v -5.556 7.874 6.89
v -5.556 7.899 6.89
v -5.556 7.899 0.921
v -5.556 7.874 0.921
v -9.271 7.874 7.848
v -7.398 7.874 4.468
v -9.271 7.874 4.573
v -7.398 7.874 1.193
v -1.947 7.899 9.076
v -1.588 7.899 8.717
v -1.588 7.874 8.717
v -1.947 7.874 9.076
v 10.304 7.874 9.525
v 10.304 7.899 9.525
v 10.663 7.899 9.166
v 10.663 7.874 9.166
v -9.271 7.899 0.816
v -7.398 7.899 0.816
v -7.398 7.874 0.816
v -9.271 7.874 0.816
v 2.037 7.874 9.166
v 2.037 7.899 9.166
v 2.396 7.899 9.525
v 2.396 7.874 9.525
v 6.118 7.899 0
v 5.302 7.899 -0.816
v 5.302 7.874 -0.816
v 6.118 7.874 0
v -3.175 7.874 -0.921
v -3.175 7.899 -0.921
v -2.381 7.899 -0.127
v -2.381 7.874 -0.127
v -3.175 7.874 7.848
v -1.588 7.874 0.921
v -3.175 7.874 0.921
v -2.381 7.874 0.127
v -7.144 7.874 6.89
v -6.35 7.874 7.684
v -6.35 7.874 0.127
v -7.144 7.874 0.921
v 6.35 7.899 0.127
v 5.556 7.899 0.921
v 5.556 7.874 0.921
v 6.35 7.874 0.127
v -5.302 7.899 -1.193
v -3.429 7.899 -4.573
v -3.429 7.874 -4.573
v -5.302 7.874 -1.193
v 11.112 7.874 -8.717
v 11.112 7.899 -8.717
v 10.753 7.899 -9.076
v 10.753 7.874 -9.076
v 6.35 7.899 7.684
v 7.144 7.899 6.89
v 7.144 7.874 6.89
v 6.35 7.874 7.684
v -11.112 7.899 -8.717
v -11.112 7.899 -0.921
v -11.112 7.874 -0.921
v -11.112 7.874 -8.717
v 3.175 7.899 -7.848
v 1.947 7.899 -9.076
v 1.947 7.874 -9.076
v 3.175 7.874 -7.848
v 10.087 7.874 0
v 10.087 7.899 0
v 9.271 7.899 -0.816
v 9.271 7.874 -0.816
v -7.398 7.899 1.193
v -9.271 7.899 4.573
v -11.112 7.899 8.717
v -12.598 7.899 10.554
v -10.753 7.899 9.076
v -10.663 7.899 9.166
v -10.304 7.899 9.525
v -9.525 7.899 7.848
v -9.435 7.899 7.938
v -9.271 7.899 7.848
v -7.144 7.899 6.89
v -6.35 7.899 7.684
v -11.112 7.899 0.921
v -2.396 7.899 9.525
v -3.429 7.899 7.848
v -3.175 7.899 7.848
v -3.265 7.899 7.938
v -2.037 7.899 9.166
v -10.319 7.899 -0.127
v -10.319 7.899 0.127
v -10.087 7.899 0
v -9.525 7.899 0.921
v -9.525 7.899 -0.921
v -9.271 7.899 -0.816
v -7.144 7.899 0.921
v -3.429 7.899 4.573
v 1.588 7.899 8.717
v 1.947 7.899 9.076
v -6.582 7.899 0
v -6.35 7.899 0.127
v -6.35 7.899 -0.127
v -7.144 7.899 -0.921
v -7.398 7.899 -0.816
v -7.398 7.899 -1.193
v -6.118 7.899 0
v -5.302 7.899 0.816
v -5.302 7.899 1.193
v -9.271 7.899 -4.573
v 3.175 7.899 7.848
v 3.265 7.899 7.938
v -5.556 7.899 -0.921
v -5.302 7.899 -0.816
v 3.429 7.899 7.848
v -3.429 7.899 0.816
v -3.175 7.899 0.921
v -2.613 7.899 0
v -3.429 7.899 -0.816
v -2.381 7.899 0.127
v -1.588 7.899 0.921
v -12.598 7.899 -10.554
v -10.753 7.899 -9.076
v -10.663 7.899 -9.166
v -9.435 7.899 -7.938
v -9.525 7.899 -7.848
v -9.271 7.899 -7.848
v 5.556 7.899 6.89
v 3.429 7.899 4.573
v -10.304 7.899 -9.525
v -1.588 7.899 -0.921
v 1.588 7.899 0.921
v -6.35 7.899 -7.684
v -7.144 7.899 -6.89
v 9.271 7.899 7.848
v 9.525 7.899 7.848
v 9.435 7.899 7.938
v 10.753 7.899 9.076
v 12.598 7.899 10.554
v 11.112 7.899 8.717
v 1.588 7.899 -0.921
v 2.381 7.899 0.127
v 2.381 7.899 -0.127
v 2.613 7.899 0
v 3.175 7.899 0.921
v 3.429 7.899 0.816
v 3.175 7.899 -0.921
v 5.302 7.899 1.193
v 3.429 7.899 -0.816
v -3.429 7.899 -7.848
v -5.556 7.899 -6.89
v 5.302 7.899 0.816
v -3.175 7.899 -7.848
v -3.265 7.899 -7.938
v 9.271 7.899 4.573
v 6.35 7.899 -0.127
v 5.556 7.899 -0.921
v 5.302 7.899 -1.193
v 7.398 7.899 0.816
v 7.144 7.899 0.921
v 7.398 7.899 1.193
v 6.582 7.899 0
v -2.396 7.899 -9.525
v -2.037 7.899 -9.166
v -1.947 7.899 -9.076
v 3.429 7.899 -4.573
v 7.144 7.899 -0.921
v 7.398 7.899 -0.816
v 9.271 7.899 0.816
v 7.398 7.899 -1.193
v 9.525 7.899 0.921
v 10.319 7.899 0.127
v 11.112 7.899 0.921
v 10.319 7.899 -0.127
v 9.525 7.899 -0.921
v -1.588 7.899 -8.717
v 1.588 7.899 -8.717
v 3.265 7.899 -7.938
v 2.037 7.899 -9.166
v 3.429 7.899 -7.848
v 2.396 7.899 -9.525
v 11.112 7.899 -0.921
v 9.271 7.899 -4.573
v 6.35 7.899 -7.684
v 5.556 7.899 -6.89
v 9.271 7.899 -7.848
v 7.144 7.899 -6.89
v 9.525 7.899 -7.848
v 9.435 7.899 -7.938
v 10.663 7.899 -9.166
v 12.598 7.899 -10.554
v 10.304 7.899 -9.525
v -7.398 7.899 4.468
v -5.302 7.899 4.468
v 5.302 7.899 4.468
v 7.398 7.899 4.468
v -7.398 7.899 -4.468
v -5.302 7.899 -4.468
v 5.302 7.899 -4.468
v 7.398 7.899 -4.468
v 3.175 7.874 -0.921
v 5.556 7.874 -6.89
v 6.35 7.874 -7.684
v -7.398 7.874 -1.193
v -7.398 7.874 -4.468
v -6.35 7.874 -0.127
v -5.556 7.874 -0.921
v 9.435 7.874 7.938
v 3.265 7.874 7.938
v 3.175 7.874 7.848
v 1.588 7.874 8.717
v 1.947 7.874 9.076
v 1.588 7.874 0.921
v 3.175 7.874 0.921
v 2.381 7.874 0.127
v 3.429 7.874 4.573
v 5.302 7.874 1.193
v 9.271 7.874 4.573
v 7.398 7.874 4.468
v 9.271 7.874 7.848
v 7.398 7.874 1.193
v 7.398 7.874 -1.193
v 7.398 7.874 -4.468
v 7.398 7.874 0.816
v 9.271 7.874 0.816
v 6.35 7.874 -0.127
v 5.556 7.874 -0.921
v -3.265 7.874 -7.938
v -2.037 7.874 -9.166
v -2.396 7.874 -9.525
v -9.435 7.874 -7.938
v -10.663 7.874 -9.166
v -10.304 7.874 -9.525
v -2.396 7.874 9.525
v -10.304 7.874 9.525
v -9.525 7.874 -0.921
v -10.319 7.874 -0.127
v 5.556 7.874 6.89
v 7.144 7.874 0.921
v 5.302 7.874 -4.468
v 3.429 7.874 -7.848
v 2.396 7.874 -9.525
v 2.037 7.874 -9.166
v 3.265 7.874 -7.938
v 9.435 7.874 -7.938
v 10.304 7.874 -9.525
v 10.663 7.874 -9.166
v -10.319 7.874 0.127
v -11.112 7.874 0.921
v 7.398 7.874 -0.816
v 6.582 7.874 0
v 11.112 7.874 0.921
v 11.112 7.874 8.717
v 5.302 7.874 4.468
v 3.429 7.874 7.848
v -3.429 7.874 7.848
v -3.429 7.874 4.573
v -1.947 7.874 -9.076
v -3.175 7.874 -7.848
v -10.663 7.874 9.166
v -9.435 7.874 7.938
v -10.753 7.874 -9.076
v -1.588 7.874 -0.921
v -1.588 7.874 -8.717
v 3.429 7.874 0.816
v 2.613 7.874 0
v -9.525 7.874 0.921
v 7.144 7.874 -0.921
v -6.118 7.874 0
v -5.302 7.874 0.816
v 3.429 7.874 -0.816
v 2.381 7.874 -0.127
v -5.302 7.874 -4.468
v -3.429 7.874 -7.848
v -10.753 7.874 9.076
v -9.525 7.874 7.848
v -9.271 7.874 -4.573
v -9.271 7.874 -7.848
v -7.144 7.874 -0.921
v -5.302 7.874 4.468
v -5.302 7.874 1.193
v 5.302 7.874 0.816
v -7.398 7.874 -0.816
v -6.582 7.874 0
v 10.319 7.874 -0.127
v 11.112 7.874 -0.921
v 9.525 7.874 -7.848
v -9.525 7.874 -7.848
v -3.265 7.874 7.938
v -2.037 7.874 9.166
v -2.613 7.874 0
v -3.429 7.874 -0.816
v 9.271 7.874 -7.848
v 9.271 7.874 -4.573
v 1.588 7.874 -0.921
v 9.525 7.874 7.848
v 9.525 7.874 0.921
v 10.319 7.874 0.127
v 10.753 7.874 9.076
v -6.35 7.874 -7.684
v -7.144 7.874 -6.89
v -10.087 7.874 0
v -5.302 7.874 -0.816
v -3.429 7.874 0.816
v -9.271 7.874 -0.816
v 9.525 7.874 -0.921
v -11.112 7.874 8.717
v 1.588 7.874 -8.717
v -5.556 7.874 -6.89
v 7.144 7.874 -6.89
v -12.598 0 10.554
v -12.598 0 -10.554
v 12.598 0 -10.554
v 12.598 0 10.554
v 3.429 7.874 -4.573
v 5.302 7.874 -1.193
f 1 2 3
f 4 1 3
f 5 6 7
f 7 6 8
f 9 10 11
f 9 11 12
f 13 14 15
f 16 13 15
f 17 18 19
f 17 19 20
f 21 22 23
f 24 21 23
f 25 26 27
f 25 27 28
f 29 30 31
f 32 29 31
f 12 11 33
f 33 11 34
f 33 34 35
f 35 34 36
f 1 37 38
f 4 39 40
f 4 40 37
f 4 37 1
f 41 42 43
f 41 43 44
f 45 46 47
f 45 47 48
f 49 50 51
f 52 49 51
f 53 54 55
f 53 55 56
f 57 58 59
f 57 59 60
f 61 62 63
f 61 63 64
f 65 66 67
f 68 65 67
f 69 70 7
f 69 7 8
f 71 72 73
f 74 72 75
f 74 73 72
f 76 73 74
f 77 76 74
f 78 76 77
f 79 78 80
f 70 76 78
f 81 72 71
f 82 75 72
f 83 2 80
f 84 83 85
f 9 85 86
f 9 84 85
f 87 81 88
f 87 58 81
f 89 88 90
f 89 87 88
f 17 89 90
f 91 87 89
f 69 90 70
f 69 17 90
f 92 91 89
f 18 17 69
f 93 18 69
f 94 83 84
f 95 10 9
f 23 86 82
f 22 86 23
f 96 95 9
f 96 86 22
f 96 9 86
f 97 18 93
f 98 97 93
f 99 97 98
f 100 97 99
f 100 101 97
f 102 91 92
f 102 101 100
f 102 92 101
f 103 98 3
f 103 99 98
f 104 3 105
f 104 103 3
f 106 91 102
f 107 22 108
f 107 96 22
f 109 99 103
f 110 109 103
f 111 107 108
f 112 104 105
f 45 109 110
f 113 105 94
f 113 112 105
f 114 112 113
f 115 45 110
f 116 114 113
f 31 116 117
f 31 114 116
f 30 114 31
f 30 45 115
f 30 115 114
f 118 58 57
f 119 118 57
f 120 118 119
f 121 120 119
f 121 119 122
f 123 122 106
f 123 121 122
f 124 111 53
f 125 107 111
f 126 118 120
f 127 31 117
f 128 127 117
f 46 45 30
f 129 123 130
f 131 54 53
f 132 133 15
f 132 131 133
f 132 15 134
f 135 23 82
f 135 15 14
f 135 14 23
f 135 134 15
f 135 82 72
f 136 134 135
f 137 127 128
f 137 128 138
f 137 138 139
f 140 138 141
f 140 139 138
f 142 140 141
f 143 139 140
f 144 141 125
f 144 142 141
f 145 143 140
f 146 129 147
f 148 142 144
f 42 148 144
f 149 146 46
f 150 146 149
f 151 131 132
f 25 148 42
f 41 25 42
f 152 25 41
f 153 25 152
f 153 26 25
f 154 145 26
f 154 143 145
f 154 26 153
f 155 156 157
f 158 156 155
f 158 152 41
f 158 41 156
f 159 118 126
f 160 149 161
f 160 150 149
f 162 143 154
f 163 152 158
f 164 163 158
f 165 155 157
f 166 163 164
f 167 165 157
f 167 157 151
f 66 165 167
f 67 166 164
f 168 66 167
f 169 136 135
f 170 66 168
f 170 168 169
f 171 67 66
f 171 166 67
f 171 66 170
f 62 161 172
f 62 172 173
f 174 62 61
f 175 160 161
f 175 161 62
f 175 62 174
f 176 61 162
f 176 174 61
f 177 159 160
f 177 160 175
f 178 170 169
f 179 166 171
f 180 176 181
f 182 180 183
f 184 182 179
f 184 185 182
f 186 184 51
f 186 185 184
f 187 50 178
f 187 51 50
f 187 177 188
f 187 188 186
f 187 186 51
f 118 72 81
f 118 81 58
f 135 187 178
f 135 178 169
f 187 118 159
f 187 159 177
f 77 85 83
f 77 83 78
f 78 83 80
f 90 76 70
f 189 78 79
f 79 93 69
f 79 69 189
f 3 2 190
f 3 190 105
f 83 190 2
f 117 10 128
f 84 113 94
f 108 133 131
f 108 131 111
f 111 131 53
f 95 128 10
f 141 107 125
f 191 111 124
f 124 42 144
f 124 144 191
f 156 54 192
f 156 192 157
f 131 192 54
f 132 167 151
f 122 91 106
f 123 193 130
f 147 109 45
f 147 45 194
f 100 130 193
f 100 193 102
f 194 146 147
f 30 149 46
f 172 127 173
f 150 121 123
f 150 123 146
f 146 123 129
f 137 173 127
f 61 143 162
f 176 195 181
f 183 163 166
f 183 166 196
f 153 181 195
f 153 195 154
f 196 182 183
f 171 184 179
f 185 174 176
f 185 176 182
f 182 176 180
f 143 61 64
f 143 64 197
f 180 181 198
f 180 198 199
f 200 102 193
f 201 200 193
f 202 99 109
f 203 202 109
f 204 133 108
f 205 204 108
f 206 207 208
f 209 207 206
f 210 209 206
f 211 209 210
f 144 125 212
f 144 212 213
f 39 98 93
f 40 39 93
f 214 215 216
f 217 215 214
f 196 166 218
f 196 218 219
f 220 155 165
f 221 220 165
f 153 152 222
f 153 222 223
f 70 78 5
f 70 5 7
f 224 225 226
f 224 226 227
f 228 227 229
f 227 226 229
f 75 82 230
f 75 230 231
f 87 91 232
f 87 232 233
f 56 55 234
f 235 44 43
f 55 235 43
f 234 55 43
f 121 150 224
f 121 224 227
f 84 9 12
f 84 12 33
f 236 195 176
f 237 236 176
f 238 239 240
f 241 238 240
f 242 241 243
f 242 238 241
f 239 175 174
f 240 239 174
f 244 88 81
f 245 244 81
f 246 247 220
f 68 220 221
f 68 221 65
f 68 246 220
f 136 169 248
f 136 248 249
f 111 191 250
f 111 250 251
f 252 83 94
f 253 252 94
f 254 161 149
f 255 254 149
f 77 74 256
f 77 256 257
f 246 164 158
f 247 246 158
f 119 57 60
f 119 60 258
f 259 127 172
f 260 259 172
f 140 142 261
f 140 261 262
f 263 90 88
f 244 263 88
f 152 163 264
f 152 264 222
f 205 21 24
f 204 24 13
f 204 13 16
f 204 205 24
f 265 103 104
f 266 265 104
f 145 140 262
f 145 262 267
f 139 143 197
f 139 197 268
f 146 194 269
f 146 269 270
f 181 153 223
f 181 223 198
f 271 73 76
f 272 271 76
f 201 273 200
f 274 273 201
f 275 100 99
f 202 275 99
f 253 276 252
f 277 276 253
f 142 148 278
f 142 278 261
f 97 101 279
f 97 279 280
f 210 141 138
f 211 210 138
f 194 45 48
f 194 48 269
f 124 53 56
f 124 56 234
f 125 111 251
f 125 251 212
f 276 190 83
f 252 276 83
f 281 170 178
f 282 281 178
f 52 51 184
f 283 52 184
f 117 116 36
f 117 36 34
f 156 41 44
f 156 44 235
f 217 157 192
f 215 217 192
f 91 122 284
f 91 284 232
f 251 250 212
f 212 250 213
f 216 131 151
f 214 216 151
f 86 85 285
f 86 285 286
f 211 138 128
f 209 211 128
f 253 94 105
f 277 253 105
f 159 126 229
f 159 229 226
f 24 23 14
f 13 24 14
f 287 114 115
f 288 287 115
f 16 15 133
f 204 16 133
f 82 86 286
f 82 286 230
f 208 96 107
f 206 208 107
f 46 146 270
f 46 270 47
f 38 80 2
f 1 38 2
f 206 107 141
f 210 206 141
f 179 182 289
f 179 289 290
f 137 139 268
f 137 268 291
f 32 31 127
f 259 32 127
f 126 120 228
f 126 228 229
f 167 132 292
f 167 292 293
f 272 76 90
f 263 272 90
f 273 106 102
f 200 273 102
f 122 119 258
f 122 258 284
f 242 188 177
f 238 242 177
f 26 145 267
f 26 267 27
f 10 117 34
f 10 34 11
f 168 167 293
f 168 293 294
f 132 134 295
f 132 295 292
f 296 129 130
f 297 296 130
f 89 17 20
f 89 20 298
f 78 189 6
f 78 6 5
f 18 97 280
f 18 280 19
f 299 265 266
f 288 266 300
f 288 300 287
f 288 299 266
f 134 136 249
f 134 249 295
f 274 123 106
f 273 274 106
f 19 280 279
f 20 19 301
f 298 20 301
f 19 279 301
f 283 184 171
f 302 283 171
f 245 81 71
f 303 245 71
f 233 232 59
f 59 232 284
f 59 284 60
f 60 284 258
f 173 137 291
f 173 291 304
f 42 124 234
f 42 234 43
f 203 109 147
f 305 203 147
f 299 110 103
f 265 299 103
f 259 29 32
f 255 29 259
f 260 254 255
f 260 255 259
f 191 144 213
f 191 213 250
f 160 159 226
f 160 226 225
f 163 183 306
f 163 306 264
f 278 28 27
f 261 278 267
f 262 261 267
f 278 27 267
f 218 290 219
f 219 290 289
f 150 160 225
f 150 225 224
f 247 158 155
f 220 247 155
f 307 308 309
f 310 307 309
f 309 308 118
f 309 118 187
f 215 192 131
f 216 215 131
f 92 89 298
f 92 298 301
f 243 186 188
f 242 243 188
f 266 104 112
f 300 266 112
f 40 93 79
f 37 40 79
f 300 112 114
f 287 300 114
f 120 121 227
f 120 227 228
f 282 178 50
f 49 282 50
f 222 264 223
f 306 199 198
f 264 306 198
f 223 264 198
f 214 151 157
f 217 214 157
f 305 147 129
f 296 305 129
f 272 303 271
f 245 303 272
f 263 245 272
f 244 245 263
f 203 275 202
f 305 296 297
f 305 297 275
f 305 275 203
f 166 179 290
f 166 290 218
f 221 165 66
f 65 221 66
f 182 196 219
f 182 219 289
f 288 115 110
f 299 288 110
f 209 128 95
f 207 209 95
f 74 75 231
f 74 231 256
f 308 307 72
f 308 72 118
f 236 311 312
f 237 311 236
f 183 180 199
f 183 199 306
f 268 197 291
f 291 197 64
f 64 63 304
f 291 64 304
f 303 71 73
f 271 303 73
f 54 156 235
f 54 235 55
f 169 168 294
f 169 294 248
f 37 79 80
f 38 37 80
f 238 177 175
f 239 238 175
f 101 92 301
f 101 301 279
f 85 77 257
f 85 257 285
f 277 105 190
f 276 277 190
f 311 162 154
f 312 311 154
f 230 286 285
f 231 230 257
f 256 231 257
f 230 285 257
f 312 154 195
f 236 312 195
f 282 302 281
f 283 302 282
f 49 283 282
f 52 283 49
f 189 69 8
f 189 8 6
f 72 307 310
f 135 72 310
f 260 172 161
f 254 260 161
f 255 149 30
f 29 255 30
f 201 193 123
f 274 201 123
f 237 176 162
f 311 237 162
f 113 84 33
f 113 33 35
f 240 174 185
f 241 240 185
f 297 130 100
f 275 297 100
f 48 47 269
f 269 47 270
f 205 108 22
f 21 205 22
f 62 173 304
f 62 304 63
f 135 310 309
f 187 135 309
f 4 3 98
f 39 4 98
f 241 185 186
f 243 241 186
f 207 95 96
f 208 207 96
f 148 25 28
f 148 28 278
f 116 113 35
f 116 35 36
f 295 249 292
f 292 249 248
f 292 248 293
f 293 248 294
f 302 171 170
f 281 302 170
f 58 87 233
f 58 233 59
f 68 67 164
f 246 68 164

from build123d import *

# Parameters (mm, degrees)
SKETCH1_W           = 25.1968
SKETCH1_H           = 21.1074
BOSS_EXTRUDE1_DEPTH = 7.8994
CUT_EXTRUDE1_DEPTH  = 0.0254


with BuildPart() as part:
    # Sketch1 → Boss-Extrude1 (new body)
    with BuildSketch(Plane(origin=(0, 0, 0), x_dir=(1, 0, 0), z_dir=(0, 1, 0))):
        Rectangle(SKETCH1_W, SKETCH1_H)
    extrude(amount=BOSS_EXTRUDE1_DEPTH)

    # Sketch2 → Cut-Extrude1 (cut)
    with BuildSketch(Plane(origin=(0, 7.8994, 0), x_dir=(1, 0, 0), z_dir=(0, 1, 0))):
        Polygon((-11.1125, 0.92075), (-11.1125, 8.716776949), (-10.753289755, 9.075987194), (-9.525, 7.847697439), (-9.525, 0.92075), (-10.31875, 0.127), align=None)
        Polygon((-9.435197439, 7.9375), (-10.663487194, 9.165789755), (-10.304276949, 9.525), (-2.395723051, 9.525), (-2.036512806, 9.165789755), (-3.264802561, 7.9375), align=None)
        Polygon((-6.35, 7.6835), (-7.14375, 6.88975), (-7.14375, 0.92075), (-6.35, 0.127), (-5.55625, 0.92075), (-5.55625, 6.88975), align=None)
        Polygon((-10.086539755, 0), (-9.271, 0.815539755), (-7.39775, 0.815539755), (-6.582210245, 0), (-7.39775, -0.815539755), (-9.271, -0.815539755), align=None)
        Polygon((-9.271, 7.847697439), (-9.271, 4.572766625), (-7.39775, 1.192727616), (-7.39775, 4.46765843), align=None)
        Polygon((-5.30225, 4.46765843), (-3.429, 7.847697439), (-3.429, 4.572766625), (-5.30225, 1.192727616), align=None)
        Polygon((-5.30225, 0.815539755), (-6.117789755, 0), (-5.30225, -0.815539755), (-3.429, -0.815539755), (-2.613460245, 0), (-3.429, 0.815539755), align=None)
        Polygon((-2.38125, 0.127), (-1.5875, 0.92075), (-1.5875, 8.716776949), (-1.946710245, 9.075987194), (-3.175, 7.847697439), (-3.175, 0.92075), align=None)
        Polygon((-1.5875, -0.92075), (-1.5875, -8.716776949), (-1.946710245, -9.075987194), (-3.175, -7.847697439), (-3.175, -0.92075), (-2.38125, -0.127), align=None)
        Polygon((-3.264802561, -7.9375), (-2.036512806, -9.165789755), (-2.395723051, -9.525), (-10.304276949, -9.525), (-10.663487194, -9.165789755), (-9.435197439, -7.9375), align=None)
        Polygon((-6.35, -7.6835), (-5.55625, -6.88975), (-5.55625, -0.92075), (-6.35, -0.127), (-7.14375, -0.92075), (-7.14375, -6.88975), align=None)
        Polygon((-3.429, -7.847697439), (-3.429, -4.572766625), (-5.30225, -1.192727616), (-5.30225, -4.46765843), align=None)
        Polygon((-7.39775, -4.46765843), (-9.271, -7.847697439), (-9.271, -4.572766625), (-7.39775, -1.192727616), align=None)
        Polygon((-10.31875, -0.127), (-11.1125, -0.92075), (-11.1125, -8.716776949), (-10.753289755, -9.075987194), (-9.525, -7.847697439), (-9.525, -0.92075), align=None)
    cut_extrude1 = extrude(amount=-CUT_EXTRUDE1_DEPTH, mode=Mode.SUBTRACT)

    # Mirror1: Cut-Extrude1 across plane
    add(cut_extrude1.mirror(Plane(origin=(0, 0, 0), x_dir=(0, 0, 1), z_dir=(1, 0, 0))), mode=Mode.SUBTRACT)


solid = part.part
